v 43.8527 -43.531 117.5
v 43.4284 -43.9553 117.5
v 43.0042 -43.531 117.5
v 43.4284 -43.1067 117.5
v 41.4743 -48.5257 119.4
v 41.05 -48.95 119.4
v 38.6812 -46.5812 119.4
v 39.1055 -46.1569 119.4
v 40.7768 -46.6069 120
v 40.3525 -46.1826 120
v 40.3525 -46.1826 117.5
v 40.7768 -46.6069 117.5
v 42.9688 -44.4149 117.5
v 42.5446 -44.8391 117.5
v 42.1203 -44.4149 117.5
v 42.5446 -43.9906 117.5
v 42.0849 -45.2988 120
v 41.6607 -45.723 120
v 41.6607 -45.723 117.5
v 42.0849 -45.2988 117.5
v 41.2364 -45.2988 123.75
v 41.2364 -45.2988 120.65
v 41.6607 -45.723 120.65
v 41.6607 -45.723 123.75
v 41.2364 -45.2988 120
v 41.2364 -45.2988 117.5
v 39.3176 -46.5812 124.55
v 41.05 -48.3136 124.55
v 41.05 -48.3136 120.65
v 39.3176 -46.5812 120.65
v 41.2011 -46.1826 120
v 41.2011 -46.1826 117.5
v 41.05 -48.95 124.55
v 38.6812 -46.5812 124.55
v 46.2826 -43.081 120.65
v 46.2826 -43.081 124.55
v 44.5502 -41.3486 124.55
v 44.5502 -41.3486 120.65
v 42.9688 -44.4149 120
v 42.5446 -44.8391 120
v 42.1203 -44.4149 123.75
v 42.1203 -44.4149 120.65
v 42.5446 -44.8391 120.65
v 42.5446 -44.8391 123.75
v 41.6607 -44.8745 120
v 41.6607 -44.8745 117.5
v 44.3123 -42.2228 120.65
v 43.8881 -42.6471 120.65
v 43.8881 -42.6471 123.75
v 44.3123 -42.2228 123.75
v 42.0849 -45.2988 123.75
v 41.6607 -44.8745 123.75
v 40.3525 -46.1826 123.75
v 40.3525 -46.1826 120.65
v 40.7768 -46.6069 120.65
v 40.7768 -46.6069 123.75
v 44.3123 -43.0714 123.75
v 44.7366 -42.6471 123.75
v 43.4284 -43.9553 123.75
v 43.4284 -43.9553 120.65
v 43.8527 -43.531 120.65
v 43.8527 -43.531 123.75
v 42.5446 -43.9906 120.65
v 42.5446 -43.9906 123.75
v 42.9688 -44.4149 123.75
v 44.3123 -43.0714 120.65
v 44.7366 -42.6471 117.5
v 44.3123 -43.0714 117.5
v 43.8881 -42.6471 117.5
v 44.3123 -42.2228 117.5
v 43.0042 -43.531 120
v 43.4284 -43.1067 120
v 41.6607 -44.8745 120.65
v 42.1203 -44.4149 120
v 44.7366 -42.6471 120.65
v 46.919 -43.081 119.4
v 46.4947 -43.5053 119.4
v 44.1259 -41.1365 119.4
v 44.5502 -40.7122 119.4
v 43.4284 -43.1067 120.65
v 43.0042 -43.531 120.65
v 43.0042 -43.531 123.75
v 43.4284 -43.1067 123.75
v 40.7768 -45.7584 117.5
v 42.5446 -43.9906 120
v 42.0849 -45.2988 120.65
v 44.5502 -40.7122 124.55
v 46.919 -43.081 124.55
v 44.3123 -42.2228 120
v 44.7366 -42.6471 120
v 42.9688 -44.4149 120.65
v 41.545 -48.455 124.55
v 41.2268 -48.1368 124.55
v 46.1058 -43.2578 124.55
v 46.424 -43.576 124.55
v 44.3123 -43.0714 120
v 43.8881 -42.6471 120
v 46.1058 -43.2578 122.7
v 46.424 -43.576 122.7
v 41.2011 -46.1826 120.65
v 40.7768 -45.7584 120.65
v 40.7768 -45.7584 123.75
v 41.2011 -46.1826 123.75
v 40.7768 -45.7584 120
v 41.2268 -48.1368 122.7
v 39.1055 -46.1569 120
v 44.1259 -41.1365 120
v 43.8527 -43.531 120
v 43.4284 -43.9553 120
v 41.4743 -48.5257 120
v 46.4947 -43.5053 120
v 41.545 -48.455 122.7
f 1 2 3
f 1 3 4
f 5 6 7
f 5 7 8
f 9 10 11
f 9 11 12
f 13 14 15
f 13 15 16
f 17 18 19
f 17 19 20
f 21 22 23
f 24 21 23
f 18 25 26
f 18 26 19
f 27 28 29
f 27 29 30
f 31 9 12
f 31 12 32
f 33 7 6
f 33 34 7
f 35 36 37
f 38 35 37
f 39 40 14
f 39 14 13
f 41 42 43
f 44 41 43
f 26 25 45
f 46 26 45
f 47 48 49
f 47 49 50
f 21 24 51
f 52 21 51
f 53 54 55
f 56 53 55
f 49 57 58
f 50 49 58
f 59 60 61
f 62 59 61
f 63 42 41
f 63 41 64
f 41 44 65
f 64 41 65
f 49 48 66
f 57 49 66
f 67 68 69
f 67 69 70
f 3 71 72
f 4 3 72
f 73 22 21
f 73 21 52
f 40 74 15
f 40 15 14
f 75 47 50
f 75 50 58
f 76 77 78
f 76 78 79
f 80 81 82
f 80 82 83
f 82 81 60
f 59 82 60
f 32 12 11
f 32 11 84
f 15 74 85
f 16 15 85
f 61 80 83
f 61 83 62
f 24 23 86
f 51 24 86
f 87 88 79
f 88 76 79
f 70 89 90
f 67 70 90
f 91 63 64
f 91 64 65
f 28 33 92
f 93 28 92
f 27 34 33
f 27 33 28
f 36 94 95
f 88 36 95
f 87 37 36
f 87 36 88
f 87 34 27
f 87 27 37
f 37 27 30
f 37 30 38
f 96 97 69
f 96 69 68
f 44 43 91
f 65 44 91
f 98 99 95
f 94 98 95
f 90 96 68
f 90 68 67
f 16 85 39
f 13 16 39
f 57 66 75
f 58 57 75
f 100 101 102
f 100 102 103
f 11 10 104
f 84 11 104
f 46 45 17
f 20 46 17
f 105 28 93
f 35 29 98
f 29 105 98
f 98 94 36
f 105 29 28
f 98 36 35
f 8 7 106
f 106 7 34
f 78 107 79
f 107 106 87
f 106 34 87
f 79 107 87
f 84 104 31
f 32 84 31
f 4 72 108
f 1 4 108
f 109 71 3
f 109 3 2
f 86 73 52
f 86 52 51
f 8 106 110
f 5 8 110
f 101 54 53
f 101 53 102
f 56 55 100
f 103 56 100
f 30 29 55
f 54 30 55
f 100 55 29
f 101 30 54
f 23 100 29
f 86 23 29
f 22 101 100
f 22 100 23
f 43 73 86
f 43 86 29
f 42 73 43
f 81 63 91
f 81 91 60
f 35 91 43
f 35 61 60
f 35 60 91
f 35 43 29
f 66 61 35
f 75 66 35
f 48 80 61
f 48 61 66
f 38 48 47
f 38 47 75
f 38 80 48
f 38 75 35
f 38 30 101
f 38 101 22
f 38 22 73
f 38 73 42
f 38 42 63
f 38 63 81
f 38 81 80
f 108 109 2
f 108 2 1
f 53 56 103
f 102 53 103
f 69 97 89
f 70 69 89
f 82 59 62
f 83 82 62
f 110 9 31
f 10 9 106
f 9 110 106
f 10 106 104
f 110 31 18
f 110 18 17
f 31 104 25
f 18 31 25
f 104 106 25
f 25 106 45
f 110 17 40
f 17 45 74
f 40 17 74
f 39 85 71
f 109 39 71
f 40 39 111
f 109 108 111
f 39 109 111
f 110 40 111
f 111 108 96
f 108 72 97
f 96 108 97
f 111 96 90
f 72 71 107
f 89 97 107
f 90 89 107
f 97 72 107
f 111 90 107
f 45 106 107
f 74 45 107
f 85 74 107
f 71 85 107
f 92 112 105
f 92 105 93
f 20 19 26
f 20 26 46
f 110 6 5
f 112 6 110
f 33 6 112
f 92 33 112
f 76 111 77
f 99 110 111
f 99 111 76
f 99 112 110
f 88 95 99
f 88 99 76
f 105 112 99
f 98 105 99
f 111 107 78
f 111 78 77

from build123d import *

# Parameters (mm, degrees)
SKETCH052_W             = 8.3
SKETCH052_H             = 3.35
PAD022_DEPTH            = 4.55
SKETCH053_W             = 0.6
SKETCH053_H             = 3.35
PAD023_DEPTH            = 0.6
SKETCH054_W             = 7.4
SKETCH054_H             = 2.45
POCKET006_DEPTH         = 3.9
SKETCH055_W             = 6.9
SKETCH055_H             = 1.85
POCKET007_DEPTH         = 0.45
SKETCH004_W             = 0.6
SKETCH004_H             = 0.6
PAD024_DEPTH            = 2.5
SKETCH005_W             = 0.6
SKETCH005_H             = 0.6
PAD025_DEPTH            = 3.75
BODY002_PLACEMENT_ANGLE = 45


with BuildPart() as part:
    # Sketch052 → Pad022 (new body)
    with BuildSketch(Plane.XY):
        with Locations((4.15, 1.675)):
            Rectangle(SKETCH052_W, SKETCH052_H)
    extrude(amount=PAD022_DEPTH)

    # Sketch053 (on Face5 of Pad022) → Pad023 (join)
    with BuildSketch(Plane(origin=(0, 0, 0), x_dir=(1, 0, 0), z_dir=(0, 0, -1))):
        with Locations((0.3, -1.675)):
            Rectangle(SKETCH053_W, SKETCH053_H)
        with Locations((8, -1.675)):
            Rectangle(SKETCH053_W, SKETCH053_H)
    extrude(amount=PAD023_DEPTH)

    # Sketch054 (on Face7 of Pad023) → Pocket006 (cut)
    with BuildSketch(Plane.XY.offset(4.55)):
        with Locations((4.15, 1.675)):
            Rectangle(SKETCH054_W, SKETCH054_H)
    extrude(amount=-POCKET006_DEPTH, mode=Mode.SUBTRACT)

    # Sketch055 (on Face1 of Pocket006) → Pocket007 (cut)
    with BuildSketch(Plane.XZ):
        with Locations((4.15, 3.625)):
            Rectangle(SKETCH055_W, SKETCH055_H)
    extrude(amount=-POCKET007_DEPTH, mode=Mode.SUBTRACT)

    # Sketch004 (on Face3 of Pocket007) → Pad024 (join)
    with BuildSketch(Plane(origin=(0, 0, 0), x_dir=(1, 0, 0), z_dir=(0, 0, -1))):
        with Locations((1.76363, -2.15)):
            Rectangle(SKETCH004_W, SKETCH004_H)
        with Locations((3.01363, -2.15)):
            Rectangle(SKETCH004_W, SKETCH004_H)
        with Locations((4.26363, -2.15)):
            Rectangle(SKETCH004_W, SKETCH004_H)
        with Locations((5.51363, -2.15)):
            Rectangle(SKETCH004_W, SKETCH004_H)
        with Locations((6.76363, -2.15)):
            Rectangle(SKETCH004_W, SKETCH004_H)
    extrude(amount=PAD024_DEPTH)

    # Sketch005 (on Face3 of Pad024) → Pad025 (join)
    with BuildSketch(Plane(origin=(0, 0, 0), x_dir=(1, 0, 0), z_dir=(0, 0, -1))):
        with Locations((1.76363, -2.15)):
            Rectangle(SKETCH005_W, SKETCH005_H)
        with Locations((3.01363, -2.15)):
            Rectangle(SKETCH005_W, SKETCH005_H)
        with Locations((4.26363, -2.15)):
            Rectangle(SKETCH005_W, SKETCH005_H)
        with Locations((5.51363, -2.15)):
            Rectangle(SKETCH005_W, SKETCH005_H)
        with Locations((6.76363, -2.15)):
            Rectangle(SKETCH005_W, SKETCH005_H)
    extrude(amount=-PAD025_DEPTH)


with BuildPart() as part_1:
    # Body002 placement: moved
    add(part.part.moved(Location((41.05, -48.95, 120))).rotate(Axis((41.05, -48.95, 120), (0, 0, 1)), BODY002_PLACEMENT_ANGLE))


solid = part_1.part
